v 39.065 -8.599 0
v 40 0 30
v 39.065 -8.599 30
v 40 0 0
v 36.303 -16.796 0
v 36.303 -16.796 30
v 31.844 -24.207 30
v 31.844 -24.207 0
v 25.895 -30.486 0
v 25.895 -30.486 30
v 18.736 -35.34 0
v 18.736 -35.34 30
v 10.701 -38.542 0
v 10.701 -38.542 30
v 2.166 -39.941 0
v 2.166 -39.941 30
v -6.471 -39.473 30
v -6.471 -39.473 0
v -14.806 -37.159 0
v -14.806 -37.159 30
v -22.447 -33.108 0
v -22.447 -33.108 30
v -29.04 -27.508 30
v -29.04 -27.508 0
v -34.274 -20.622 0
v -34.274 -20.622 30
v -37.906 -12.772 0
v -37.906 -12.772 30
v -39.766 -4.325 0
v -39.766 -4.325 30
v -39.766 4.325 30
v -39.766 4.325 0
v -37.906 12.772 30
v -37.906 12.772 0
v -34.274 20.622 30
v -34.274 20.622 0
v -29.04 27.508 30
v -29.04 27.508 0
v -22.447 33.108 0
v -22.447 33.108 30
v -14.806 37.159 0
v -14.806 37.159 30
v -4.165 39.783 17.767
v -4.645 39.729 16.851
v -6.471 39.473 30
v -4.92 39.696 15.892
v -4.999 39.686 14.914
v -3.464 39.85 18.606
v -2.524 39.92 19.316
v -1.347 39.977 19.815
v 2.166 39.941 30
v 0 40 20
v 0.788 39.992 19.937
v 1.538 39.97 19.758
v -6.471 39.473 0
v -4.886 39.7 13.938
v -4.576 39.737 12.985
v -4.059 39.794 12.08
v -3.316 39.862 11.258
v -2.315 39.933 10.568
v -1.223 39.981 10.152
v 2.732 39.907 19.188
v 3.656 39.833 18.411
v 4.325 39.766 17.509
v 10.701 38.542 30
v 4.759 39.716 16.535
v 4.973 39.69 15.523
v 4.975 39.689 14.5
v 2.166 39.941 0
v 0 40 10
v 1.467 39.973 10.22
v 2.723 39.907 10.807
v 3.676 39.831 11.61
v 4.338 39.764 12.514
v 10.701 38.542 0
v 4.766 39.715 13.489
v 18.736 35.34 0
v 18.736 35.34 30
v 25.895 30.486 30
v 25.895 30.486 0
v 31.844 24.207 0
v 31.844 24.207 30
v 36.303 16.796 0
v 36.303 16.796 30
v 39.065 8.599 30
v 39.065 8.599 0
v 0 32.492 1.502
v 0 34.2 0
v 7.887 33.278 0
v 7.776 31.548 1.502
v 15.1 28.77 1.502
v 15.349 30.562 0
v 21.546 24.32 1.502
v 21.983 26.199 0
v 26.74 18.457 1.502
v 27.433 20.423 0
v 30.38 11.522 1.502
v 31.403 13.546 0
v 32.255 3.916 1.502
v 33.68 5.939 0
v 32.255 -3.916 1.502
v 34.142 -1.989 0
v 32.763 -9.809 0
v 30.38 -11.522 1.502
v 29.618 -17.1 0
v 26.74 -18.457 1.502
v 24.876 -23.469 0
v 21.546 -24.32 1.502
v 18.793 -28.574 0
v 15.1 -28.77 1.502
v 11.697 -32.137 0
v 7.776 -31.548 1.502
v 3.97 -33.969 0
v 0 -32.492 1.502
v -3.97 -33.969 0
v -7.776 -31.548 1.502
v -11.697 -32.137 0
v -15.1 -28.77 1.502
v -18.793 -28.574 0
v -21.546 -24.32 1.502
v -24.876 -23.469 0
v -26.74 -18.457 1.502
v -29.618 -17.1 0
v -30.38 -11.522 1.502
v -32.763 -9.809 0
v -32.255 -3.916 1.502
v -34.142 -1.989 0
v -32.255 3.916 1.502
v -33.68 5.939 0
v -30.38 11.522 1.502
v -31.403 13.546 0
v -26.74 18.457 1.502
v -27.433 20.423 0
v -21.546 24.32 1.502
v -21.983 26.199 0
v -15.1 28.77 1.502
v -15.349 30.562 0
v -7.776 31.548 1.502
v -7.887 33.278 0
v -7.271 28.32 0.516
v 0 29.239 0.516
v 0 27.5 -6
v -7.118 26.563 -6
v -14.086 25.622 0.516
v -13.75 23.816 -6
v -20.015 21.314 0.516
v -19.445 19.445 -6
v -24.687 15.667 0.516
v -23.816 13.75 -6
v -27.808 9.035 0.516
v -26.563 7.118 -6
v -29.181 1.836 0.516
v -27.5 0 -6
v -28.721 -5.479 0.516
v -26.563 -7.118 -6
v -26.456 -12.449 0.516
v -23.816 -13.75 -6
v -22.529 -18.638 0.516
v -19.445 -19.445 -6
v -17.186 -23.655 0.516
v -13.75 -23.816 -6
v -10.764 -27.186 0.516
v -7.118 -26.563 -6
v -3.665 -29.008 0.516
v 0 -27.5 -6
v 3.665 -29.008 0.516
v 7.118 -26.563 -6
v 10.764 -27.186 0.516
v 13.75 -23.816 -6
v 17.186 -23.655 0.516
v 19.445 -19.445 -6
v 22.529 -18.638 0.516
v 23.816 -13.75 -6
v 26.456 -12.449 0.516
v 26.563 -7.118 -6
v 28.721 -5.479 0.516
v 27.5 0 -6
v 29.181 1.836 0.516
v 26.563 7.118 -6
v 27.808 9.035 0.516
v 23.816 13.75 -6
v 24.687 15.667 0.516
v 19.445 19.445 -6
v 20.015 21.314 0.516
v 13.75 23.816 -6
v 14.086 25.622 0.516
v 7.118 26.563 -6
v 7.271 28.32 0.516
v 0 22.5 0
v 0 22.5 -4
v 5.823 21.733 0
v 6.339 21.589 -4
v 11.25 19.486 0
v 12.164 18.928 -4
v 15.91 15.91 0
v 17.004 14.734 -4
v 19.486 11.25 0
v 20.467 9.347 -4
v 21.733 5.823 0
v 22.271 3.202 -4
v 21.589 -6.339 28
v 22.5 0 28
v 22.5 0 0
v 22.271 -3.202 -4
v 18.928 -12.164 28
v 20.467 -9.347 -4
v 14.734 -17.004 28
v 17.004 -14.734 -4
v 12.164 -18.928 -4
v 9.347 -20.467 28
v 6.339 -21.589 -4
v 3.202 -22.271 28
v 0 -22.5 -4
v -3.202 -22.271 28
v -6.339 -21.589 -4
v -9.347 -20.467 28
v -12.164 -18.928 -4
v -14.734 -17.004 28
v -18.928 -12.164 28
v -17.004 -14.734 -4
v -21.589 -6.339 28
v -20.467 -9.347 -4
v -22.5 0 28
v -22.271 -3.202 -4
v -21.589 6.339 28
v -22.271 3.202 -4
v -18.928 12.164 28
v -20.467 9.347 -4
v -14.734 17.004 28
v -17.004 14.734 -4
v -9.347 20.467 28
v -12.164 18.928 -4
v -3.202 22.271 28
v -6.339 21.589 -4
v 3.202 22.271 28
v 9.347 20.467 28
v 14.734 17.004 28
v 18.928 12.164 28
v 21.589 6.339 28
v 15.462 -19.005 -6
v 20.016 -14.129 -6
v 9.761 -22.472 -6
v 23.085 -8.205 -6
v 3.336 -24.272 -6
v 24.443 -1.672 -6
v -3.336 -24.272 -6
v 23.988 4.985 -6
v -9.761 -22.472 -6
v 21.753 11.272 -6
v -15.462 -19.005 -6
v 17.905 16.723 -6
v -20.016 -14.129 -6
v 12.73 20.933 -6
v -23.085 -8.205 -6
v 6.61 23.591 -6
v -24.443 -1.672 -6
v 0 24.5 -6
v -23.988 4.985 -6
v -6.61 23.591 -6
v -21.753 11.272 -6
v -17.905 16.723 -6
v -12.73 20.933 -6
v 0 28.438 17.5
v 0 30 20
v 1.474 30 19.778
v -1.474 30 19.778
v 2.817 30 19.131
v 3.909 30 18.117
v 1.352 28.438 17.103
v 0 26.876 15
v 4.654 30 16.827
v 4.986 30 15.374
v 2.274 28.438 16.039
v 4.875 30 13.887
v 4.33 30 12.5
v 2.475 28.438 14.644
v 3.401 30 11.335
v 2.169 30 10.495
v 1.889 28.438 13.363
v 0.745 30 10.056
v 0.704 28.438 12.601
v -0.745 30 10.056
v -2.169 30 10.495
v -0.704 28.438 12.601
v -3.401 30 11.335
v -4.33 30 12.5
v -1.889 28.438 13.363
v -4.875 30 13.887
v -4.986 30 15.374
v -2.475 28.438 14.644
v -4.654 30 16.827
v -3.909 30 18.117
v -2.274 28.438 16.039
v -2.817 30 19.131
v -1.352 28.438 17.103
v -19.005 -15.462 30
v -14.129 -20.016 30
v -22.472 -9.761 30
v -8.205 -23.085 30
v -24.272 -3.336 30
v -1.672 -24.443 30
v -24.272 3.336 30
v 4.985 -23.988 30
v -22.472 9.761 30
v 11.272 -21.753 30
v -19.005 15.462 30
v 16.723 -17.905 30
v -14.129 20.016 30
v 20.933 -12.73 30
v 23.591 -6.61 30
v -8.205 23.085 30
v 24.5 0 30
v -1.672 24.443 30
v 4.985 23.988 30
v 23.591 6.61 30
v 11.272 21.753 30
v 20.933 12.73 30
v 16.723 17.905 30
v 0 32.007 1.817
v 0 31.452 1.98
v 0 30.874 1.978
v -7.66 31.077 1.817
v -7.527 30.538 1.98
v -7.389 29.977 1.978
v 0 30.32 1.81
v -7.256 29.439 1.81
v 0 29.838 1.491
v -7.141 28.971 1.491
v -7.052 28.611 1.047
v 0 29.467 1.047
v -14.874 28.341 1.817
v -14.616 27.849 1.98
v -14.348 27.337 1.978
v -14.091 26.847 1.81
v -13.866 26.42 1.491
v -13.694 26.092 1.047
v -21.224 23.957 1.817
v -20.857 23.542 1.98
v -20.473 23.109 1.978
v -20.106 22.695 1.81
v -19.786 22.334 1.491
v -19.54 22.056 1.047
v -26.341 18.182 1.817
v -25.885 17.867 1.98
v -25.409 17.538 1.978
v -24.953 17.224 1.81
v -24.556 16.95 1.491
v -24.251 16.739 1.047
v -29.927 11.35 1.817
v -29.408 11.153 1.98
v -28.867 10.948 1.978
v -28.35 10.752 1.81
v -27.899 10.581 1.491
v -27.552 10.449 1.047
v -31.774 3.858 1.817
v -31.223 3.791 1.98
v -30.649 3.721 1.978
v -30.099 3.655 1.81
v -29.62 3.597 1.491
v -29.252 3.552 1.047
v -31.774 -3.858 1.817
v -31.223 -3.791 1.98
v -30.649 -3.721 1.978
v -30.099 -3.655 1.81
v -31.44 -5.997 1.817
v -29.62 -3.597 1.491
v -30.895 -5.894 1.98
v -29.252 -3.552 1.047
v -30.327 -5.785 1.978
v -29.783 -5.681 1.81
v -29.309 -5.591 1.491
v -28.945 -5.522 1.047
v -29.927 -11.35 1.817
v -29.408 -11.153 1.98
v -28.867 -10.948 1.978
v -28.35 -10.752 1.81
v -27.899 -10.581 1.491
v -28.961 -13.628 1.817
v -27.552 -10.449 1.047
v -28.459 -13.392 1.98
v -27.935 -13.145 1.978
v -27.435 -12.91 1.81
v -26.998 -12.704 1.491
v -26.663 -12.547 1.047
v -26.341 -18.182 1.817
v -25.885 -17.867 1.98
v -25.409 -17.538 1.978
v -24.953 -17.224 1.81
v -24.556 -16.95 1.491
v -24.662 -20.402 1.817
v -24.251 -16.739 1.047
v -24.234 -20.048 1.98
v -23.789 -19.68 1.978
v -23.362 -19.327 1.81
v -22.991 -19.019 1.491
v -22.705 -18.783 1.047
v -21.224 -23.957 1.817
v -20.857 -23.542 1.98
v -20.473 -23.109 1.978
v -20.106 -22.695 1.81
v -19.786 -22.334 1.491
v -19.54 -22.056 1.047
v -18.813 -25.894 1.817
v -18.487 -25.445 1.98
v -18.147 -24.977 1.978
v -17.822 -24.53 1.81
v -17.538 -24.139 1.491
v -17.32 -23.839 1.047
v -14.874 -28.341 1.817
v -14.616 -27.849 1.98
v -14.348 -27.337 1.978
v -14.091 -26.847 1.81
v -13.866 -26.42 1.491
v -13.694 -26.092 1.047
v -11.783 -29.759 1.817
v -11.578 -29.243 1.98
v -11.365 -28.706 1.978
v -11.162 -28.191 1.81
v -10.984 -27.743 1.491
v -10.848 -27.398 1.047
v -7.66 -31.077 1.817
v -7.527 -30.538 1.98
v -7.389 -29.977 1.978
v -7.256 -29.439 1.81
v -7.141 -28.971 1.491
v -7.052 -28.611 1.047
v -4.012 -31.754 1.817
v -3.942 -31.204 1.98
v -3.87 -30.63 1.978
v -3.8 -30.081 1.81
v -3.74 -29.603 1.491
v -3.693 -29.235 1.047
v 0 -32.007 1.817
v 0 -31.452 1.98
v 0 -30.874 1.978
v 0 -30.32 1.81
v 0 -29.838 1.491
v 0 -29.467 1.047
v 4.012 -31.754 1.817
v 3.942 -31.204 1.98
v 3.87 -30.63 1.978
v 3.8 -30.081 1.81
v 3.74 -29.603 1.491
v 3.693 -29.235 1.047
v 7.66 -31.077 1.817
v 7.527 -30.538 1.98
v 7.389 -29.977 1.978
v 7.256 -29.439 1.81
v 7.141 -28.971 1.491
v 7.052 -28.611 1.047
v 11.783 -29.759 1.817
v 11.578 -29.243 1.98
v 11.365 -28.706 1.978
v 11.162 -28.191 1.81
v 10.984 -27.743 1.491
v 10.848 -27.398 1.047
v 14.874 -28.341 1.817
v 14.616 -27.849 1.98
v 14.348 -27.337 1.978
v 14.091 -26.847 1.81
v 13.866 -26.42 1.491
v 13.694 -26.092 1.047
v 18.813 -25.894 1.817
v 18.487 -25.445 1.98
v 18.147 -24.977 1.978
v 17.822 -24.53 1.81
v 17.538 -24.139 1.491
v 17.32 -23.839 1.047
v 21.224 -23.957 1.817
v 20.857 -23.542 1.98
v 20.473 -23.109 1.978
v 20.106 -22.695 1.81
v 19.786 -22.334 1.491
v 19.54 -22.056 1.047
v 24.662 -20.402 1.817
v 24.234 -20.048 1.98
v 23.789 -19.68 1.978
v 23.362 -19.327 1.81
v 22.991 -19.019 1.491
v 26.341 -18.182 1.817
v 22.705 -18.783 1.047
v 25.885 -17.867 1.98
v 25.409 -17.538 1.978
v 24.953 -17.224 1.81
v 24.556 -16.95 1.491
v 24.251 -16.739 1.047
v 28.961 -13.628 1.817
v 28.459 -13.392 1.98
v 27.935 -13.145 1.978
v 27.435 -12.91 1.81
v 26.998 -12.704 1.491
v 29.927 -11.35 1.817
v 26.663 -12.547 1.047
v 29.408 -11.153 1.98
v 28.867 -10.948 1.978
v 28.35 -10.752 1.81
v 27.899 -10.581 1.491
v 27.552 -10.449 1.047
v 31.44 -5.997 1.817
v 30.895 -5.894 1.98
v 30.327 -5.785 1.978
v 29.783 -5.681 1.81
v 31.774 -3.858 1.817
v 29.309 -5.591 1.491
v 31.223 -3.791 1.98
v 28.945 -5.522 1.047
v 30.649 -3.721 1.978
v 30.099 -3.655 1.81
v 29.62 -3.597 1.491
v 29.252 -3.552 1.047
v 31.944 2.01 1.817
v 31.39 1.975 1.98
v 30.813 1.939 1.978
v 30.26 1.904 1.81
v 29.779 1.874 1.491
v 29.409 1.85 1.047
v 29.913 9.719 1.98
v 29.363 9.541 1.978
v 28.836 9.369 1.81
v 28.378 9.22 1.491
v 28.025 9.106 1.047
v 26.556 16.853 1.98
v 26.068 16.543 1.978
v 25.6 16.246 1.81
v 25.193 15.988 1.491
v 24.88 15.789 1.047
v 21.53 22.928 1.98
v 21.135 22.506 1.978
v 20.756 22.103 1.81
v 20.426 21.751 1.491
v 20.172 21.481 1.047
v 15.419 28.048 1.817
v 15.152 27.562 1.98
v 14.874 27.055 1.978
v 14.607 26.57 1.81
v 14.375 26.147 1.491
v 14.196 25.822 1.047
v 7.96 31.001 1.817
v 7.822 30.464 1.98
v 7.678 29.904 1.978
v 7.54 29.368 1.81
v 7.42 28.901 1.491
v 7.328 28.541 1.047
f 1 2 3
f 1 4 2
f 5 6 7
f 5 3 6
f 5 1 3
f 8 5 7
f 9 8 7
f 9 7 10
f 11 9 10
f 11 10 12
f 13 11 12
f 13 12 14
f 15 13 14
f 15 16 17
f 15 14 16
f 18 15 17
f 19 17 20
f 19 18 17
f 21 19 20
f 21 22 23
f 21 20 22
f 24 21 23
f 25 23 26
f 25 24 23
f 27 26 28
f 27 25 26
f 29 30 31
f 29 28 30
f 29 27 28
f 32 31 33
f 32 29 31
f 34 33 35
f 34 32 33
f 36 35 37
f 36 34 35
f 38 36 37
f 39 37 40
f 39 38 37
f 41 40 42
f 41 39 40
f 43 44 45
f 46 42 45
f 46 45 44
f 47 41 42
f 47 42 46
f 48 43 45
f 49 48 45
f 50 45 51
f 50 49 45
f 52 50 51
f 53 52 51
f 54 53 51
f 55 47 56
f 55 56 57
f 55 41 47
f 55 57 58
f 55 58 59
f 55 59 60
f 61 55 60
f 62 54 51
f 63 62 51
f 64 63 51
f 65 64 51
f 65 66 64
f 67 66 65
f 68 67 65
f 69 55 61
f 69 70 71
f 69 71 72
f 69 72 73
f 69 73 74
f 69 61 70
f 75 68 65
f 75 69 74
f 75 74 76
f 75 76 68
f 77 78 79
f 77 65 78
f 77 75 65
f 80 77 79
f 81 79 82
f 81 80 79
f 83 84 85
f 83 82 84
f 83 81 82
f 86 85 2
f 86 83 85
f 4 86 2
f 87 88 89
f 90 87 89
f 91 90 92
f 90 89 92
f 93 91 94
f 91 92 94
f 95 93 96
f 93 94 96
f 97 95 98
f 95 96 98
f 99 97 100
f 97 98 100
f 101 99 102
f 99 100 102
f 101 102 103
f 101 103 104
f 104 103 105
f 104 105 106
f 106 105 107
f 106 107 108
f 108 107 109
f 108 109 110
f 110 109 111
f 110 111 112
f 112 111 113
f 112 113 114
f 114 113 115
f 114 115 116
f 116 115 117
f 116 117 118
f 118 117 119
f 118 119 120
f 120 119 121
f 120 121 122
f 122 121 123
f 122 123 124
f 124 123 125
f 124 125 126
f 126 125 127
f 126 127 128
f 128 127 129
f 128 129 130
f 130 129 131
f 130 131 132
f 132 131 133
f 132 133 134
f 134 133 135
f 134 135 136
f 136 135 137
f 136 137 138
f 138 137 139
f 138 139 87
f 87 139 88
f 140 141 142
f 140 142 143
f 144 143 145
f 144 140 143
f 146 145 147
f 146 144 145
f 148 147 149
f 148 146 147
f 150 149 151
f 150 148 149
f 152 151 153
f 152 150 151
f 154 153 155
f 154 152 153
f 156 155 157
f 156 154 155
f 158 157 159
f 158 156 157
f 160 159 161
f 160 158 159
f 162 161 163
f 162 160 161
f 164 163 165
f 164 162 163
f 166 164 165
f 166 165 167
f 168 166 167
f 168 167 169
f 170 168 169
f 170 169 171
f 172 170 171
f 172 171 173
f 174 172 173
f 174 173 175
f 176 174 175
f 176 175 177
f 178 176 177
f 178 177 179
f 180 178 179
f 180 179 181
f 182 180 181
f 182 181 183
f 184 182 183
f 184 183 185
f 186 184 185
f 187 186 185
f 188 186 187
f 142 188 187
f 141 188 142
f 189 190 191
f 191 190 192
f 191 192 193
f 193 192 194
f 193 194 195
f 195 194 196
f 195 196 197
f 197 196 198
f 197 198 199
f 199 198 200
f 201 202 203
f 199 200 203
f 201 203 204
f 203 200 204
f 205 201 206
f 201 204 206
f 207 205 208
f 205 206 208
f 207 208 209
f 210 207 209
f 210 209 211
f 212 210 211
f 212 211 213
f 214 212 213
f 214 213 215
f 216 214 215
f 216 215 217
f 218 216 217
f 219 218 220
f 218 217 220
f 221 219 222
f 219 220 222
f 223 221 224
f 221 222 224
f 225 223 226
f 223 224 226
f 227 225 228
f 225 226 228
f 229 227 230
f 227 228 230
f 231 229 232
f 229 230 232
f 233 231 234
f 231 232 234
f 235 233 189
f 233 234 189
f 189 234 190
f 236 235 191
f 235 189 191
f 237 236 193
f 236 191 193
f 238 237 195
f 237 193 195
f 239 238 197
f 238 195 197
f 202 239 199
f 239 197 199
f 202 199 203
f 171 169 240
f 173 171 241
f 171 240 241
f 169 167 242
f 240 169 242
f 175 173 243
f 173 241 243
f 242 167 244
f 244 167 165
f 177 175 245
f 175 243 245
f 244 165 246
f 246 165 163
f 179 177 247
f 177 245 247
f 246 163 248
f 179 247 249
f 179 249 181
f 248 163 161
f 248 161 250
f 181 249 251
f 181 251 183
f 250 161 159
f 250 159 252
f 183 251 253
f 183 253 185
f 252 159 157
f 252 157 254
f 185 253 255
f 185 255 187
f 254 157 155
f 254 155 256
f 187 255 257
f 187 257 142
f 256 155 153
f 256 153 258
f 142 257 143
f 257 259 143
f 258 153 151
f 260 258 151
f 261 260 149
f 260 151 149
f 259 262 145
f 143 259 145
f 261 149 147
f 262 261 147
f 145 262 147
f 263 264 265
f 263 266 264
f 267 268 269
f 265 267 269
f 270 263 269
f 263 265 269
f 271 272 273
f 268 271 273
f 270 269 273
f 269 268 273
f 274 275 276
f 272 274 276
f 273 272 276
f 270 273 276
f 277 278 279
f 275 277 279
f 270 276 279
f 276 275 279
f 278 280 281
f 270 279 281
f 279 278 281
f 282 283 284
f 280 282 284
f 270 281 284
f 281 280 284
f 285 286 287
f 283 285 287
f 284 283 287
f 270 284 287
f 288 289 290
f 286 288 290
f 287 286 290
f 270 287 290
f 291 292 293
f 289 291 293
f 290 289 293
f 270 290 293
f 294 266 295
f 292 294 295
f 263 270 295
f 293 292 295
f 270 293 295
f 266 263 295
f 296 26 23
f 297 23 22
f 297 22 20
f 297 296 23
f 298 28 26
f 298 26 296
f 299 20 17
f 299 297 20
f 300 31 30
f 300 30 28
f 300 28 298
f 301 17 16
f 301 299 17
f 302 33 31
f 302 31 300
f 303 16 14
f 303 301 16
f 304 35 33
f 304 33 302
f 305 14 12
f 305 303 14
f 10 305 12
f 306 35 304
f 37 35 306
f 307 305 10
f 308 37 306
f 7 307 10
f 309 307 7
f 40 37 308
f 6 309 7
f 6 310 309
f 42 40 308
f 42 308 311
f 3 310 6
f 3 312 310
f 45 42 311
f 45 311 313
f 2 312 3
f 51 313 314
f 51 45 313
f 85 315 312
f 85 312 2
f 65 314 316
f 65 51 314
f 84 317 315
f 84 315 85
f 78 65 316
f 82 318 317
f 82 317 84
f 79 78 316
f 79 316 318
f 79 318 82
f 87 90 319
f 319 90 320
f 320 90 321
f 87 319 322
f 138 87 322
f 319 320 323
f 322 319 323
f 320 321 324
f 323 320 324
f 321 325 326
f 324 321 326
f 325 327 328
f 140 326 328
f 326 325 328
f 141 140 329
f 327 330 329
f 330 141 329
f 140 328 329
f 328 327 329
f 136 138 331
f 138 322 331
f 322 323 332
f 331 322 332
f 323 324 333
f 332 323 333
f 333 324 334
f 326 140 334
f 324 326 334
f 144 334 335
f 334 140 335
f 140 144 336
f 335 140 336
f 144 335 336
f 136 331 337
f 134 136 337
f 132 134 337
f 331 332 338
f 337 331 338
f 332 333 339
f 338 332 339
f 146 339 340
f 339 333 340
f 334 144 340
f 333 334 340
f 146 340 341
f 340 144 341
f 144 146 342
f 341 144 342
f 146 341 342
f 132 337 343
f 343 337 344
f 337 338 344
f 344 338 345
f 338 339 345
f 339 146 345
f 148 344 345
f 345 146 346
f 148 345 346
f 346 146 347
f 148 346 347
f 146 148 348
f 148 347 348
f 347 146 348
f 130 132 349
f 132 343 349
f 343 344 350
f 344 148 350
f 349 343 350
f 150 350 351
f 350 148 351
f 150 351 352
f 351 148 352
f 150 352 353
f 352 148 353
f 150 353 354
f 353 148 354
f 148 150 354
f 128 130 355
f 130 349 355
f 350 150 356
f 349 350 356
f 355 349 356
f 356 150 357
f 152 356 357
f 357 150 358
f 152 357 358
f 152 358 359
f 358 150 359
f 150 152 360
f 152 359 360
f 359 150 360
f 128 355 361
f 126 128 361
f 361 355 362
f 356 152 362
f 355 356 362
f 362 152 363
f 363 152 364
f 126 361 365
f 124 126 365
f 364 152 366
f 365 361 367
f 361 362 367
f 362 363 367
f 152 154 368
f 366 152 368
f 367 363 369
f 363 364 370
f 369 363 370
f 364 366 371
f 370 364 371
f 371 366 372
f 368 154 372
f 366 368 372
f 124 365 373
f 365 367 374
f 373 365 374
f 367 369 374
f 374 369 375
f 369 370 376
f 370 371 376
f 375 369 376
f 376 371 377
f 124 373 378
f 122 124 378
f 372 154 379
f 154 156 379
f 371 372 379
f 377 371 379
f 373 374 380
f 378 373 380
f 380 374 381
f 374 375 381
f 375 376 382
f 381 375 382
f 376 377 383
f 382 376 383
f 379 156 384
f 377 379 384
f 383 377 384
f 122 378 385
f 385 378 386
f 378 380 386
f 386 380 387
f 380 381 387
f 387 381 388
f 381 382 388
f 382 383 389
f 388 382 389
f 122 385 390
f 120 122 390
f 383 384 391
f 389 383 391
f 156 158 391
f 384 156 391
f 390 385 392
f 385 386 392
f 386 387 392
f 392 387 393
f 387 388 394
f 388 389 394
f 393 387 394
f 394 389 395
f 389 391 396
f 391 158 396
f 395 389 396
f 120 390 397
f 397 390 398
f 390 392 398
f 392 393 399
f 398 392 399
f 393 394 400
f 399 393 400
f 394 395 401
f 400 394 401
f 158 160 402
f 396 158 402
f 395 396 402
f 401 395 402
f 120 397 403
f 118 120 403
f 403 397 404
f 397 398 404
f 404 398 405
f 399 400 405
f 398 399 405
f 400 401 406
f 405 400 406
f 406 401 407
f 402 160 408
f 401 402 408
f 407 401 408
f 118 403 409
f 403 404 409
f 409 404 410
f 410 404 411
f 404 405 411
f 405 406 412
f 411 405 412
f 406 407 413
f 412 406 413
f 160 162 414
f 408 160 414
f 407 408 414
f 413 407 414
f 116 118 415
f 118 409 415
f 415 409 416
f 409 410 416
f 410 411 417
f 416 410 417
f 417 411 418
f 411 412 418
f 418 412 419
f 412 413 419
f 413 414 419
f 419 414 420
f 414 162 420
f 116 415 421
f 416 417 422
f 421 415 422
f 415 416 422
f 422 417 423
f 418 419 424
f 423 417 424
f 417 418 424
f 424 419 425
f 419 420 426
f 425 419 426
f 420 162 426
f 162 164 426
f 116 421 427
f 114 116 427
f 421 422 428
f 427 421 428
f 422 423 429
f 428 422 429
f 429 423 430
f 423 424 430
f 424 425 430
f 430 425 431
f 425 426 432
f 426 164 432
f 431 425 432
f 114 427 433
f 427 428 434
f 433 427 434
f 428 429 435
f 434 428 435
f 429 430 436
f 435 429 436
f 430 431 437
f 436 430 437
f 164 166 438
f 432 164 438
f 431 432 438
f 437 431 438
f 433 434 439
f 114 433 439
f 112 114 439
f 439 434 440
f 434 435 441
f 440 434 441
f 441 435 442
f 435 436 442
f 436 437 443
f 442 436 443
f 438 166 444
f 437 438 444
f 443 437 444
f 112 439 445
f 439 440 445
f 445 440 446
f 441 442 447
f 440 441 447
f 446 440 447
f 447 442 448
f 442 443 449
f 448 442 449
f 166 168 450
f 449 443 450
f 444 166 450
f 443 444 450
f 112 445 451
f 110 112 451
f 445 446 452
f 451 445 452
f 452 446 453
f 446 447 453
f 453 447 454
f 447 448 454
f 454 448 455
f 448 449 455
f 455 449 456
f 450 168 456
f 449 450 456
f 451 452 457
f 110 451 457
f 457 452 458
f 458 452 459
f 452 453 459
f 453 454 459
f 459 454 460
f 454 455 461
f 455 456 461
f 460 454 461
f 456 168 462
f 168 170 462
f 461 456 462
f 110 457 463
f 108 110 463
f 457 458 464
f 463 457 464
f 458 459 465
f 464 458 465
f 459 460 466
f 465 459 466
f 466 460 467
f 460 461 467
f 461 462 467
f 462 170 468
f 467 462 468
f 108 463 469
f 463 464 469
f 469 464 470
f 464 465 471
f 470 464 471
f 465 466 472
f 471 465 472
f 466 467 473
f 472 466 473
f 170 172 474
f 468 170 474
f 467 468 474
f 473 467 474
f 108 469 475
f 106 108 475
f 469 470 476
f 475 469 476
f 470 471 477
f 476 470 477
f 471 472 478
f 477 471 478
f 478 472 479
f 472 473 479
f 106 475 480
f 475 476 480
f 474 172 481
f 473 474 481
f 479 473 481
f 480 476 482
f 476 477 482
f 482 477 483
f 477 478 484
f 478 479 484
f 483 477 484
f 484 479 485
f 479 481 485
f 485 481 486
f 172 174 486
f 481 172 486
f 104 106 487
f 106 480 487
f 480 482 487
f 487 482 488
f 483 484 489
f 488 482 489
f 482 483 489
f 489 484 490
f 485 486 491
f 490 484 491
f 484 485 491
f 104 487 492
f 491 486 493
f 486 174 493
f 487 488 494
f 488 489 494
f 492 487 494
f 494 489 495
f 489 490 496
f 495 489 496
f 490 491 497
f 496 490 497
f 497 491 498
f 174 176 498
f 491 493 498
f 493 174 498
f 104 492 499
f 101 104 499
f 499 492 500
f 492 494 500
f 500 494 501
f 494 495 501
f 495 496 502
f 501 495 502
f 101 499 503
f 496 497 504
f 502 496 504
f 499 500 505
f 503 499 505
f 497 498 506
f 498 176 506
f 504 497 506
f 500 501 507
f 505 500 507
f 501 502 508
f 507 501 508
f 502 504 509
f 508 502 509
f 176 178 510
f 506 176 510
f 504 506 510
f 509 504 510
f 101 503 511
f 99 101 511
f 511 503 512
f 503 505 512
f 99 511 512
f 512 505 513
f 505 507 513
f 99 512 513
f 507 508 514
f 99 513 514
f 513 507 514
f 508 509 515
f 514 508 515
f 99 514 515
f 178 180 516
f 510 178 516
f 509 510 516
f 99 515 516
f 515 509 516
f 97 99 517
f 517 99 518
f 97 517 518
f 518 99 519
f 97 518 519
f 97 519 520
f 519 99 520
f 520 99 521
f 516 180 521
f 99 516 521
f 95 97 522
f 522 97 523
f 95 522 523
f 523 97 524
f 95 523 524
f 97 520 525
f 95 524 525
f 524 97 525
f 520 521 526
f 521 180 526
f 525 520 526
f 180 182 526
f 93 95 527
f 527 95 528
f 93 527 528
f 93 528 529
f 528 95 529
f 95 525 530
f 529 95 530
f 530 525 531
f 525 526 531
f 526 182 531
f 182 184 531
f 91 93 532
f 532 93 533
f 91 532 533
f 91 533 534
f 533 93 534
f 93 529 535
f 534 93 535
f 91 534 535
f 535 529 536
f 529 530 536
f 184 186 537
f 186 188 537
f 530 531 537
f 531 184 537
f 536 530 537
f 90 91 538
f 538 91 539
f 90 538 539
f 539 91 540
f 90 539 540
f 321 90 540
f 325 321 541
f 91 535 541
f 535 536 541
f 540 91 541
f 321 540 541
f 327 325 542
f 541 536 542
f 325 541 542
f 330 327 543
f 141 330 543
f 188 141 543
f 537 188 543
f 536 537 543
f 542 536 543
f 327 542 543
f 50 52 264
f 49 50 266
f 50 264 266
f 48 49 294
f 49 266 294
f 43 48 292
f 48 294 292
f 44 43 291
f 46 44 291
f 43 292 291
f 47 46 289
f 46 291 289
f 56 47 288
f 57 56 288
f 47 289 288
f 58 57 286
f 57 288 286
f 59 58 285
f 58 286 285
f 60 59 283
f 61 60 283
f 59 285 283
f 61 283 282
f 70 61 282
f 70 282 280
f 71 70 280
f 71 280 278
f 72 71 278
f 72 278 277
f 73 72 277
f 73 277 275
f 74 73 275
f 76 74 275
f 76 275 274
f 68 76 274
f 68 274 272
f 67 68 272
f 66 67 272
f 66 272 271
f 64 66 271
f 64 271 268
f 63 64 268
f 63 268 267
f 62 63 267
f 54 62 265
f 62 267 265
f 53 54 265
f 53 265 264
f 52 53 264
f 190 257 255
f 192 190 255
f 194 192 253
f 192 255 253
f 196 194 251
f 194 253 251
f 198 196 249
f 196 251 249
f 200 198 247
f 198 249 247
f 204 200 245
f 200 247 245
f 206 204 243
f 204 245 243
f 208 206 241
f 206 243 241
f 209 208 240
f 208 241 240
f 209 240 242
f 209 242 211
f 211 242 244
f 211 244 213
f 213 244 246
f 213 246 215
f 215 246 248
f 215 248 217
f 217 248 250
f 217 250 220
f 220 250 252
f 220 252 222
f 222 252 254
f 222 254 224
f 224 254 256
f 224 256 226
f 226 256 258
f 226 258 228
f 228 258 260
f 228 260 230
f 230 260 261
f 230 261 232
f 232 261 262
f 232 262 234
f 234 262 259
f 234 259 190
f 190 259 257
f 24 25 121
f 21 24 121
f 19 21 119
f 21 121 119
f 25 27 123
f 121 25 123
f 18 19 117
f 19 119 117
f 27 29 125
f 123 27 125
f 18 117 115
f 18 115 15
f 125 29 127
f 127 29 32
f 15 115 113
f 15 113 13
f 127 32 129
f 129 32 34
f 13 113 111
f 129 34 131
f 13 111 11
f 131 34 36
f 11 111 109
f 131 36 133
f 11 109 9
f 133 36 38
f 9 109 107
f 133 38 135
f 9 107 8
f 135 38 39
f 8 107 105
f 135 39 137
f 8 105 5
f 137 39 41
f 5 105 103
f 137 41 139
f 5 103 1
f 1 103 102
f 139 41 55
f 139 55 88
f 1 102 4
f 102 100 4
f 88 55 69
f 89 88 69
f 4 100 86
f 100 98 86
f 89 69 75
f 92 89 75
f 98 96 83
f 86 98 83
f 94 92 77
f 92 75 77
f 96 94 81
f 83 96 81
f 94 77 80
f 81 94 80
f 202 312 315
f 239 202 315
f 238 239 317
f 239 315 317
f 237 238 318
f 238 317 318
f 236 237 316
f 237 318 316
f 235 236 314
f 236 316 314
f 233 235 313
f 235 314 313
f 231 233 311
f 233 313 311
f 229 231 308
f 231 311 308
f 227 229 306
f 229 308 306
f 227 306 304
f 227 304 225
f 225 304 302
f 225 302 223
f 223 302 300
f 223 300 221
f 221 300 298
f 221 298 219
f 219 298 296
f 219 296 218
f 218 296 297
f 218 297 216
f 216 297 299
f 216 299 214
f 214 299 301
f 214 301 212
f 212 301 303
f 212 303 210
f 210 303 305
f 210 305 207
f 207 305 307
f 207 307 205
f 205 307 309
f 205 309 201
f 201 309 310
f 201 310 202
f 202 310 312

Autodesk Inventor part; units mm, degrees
ref_plane "YZ Plane" through (0, 0, 0) normal (1, 0, 0) x (0, 1, 0)
ref_plane "XZ Plane" through (0, 0, 0) normal (0, 1, 0) x (-1, 0, 0)
ref_plane "XY Plane" through (0, 0, 0) normal (0, 0, 1) x (1, 0, 0)
sketch "Эскиз1" plane through (0, 0, 0) normal (0, 0, 1) x (1, 0, 0)
  circle A0 centre (0, 0) radius 40
  circle A1 centre (0, 0) radius 22.5
  dimension "d0" = 80
  dimension "d1" = 45
extrude "Выдавливание1" add sketch "Эскиз1" along normal blind 30
sketch "Эскиз2" plane through (0, 0, 0) normal (1, 0, 0) x (0, 1, 0)
  line L0 (40, 0) -> (-40, 0)
  line L1 (22.5, 30) -> (22.5, 0)
  line L2 (22.5, 0) -> (22.5, -6)
  line L3 (22.5, -6) -> (27.5, -6)
  arc A0 (32.491841, 1.501959) -> (29.238817, 0.515685) centre (31.17119, 0) ccw
  line L4 (27.5, -6) -> (29.238817, 0.515685)
  line L5 (34.2, 0) -> (32.491841, 1.501959)
  line L6 (0, -13.2) -> (0, 37.2)
  point P0 (0, 0)
  point P1 (29.101198, 0)
  dimension "d4" = 5
  dimension "d5" = 6
  dimension "d6" = 4
  dimension "d9" = 27.5
  dimension "d10" = 29.23882
revolve "Вращение1" add sketch "Эскиз2" angle 360 about axis through (0, 0, -10) along (0, 0, 1) contours L4 L3 L2 L0
revolve "Вращение2" cut sketch "Эскиз2" angle 360 about axis through (0, 0, -10) along (0, 0, 1) contours L0 L4 A0 L5
chamfer "Фаска1" distance 2 angle 45 2 edges at (0, -22.5, -6) (-22.5, 0, 30)
sketch "Эскиз3" plane through (0, 0, 0) normal (1, 0, 0) x (0, 1, 0)
  line L0 (40, 0) -> (40, 30)
  line L1 (40, 15) -> (26.875653, 15)
  line L2 (40, 15) -> (40, 20)
  line L3 (40, 20) -> (30, 20)
  line L4 (30, 20) -> (26.606861, 14.569843)
  point P0 (0, 0)
  dimension "d14" = 10
  dimension "d15" = 58
revolve "Вращение3" cut sketch "Эскиз3" angle 360 about axis through (0, 40, 15) along (0, -1, 0)
thread "Резьба1" size "M45x4.5" class "6H" standard "ANSI Metric M Profile" full length
properties part number "Гайка шток_CPY" material "Сталь, высокопрочная, низколегированная"
